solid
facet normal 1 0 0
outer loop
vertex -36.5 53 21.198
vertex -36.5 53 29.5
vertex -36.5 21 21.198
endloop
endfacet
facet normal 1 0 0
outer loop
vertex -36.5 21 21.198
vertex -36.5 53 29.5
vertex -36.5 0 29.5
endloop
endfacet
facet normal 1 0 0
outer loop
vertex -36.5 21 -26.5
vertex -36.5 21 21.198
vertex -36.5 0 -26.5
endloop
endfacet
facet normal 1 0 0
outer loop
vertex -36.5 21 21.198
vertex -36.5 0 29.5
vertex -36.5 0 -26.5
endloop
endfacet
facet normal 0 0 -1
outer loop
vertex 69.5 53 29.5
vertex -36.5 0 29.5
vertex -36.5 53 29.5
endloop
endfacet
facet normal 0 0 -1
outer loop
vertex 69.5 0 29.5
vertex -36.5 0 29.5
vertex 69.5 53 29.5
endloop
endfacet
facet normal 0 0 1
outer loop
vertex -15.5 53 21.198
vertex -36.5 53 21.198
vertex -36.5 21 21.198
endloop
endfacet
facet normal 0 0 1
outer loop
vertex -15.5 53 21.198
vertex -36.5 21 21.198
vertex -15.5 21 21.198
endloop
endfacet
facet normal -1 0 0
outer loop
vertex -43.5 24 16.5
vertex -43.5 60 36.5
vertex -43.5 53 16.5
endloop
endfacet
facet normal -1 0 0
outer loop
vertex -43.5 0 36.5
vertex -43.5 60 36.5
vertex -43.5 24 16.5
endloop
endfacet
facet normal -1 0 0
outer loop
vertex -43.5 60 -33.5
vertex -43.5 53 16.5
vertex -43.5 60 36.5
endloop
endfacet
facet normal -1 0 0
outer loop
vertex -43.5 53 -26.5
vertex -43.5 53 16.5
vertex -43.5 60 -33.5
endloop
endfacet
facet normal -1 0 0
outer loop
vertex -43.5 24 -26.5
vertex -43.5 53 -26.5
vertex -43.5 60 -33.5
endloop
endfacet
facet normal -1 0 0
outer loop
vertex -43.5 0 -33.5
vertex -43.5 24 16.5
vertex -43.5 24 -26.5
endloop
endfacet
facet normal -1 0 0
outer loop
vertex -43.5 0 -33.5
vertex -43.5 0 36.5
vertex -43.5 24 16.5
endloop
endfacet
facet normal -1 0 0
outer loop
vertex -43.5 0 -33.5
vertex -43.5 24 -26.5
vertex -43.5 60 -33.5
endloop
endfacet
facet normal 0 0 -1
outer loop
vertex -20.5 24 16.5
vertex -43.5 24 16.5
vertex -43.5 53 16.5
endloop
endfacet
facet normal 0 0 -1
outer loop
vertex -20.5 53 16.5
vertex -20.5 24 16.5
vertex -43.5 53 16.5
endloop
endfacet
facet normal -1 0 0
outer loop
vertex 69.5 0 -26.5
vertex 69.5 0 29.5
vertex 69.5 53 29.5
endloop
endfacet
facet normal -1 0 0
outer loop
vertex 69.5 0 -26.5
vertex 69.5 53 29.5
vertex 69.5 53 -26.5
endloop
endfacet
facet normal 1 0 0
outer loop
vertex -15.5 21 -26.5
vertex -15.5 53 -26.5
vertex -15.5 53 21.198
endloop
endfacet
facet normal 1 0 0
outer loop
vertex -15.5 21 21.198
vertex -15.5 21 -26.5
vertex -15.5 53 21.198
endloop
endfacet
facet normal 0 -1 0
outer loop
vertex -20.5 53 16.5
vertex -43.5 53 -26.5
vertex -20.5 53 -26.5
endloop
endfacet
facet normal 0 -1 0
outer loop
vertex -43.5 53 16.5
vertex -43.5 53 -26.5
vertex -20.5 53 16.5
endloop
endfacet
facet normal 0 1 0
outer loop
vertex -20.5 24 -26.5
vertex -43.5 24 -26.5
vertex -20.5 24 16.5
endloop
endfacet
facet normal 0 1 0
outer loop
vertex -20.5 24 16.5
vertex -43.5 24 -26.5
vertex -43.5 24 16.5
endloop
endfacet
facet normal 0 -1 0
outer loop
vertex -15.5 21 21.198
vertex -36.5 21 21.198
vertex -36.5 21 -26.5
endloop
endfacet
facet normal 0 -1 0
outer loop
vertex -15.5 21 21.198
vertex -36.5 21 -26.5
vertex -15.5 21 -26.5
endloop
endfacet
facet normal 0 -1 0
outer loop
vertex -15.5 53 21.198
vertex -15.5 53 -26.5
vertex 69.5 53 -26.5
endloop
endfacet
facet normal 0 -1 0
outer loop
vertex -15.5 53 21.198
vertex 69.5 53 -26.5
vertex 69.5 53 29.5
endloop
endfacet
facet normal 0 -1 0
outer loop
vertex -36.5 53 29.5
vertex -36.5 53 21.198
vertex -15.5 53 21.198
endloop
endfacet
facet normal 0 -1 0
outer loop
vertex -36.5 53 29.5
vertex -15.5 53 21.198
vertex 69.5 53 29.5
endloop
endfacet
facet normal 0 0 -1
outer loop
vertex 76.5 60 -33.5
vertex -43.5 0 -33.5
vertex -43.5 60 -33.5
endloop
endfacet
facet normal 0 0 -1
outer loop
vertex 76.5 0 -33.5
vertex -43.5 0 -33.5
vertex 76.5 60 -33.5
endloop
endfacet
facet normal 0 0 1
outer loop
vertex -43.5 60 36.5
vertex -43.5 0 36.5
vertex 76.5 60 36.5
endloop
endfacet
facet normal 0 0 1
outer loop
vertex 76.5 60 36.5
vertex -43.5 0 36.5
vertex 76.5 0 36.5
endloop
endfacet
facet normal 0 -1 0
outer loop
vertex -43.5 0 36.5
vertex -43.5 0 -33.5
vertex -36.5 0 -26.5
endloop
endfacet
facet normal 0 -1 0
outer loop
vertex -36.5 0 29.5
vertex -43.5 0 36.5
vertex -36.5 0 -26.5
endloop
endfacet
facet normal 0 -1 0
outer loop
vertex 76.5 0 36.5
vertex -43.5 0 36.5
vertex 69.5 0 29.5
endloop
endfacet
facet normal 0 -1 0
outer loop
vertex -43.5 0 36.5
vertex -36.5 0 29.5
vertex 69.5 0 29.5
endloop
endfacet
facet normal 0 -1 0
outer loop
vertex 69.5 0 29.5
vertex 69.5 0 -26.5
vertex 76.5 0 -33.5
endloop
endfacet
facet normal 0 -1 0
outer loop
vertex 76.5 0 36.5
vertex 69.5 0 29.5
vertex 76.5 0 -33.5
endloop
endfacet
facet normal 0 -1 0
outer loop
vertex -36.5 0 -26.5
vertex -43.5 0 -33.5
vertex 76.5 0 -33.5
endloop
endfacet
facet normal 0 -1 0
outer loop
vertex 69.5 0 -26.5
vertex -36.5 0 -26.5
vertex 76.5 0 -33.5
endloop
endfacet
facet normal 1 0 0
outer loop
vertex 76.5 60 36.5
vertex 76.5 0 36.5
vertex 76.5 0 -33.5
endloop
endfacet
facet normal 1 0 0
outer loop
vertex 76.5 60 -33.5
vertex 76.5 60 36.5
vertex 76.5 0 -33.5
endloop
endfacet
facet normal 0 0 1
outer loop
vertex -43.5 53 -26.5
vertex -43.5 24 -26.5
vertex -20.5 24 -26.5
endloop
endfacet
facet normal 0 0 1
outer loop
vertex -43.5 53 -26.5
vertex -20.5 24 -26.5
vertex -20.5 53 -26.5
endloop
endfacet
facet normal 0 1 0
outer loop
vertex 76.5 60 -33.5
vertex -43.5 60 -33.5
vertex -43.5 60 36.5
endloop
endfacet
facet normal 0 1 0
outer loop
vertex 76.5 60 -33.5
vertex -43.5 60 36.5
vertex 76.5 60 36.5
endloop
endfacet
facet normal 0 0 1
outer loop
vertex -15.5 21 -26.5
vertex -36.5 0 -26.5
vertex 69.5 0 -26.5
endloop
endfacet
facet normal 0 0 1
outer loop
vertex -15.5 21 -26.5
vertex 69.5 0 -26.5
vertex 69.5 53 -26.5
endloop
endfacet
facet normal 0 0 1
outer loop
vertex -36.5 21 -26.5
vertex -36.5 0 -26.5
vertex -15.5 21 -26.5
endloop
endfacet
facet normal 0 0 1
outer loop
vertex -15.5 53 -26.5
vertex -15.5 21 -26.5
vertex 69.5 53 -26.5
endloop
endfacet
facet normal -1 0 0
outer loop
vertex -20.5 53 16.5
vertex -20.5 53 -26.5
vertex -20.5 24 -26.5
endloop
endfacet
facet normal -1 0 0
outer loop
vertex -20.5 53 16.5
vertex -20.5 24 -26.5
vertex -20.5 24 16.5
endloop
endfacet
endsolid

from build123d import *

# Parameters (mm, degrees)
CROQUIS1_W              = 120
CROQUIS1_H              = 70
SALIENTE_EXTRUIR1_DEPTH = 60
CROQUIS2_W              = 106
CROQUIS2_H              = 56
CORTAR_EXTRUIR1_DEPTH   = 53
CROQUIS3_W              = 43
CROQUIS3_H              = 29
CORTAR_EXTRUIR2_DEPTH   = 20
CROQUIS4_W              = 21
CROQUIS4_H              = 47.698466119
SALIENTE_EXTRUIR2_DEPTH = 32
CROQUIS5_W              = 43
CROQUIS5_H              = 29
CORTAR_EXTRUIR3_DEPTH   = 16


with BuildPart() as part:
    # Croquis1 → Saliente-Extruir1 (new body)
    with BuildSketch(Plane(origin=(0, 0, 0), x_dir=(1, 0, 0), z_dir=(0, 1, 0))):
        with Locations((16.5, -1.5)):
            Rectangle(CROQUIS1_W, CROQUIS1_H)
    extrude(amount=SALIENTE_EXTRUIR1_DEPTH)

    # Croquis2 → Cortar-Extruir1 (cut)
    with BuildSketch(Plane(origin=(0, 0, 0), x_dir=(1, 0, 0), z_dir=(0, 1, 0))):
        with Locations((16.5, -1.5)):
            Rectangle(CROQUIS2_W, CROQUIS2_H)
    extrude(amount=CORTAR_EXTRUIR1_DEPTH, mode=Mode.SUBTRACT)

    # Croquis3 → Cortar-Extruir2 (cut)
    with BuildSketch(Plane.ZY.offset(43.5)):
        with Locations((-5, 38.5)):
            Rectangle(CROQUIS3_W, CROQUIS3_H)
    extrude(amount=-CORTAR_EXTRUIR2_DEPTH, mode=Mode.SUBTRACT)

    # Croquis4 → Saliente-Extruir2 (add)
    with BuildSketch(Plane.XZ.offset(-53)):
        with Locations((-26, -2.65076694)):
            Rectangle(CROQUIS4_W, CROQUIS4_H)
    extrude(amount=SALIENTE_EXTRUIR2_DEPTH)

    # Croquis5 → Cortar-Extruir3 (cut)
    with BuildSketch(Plane.ZY.offset(36.5)):
        with Locations((-5, 38.5)):
            Rectangle(CROQUIS5_W, CROQUIS5_H)
    extrude(amount=-CORTAR_EXTRUIR3_DEPTH, mode=Mode.SUBTRACT)


solid = part.part
